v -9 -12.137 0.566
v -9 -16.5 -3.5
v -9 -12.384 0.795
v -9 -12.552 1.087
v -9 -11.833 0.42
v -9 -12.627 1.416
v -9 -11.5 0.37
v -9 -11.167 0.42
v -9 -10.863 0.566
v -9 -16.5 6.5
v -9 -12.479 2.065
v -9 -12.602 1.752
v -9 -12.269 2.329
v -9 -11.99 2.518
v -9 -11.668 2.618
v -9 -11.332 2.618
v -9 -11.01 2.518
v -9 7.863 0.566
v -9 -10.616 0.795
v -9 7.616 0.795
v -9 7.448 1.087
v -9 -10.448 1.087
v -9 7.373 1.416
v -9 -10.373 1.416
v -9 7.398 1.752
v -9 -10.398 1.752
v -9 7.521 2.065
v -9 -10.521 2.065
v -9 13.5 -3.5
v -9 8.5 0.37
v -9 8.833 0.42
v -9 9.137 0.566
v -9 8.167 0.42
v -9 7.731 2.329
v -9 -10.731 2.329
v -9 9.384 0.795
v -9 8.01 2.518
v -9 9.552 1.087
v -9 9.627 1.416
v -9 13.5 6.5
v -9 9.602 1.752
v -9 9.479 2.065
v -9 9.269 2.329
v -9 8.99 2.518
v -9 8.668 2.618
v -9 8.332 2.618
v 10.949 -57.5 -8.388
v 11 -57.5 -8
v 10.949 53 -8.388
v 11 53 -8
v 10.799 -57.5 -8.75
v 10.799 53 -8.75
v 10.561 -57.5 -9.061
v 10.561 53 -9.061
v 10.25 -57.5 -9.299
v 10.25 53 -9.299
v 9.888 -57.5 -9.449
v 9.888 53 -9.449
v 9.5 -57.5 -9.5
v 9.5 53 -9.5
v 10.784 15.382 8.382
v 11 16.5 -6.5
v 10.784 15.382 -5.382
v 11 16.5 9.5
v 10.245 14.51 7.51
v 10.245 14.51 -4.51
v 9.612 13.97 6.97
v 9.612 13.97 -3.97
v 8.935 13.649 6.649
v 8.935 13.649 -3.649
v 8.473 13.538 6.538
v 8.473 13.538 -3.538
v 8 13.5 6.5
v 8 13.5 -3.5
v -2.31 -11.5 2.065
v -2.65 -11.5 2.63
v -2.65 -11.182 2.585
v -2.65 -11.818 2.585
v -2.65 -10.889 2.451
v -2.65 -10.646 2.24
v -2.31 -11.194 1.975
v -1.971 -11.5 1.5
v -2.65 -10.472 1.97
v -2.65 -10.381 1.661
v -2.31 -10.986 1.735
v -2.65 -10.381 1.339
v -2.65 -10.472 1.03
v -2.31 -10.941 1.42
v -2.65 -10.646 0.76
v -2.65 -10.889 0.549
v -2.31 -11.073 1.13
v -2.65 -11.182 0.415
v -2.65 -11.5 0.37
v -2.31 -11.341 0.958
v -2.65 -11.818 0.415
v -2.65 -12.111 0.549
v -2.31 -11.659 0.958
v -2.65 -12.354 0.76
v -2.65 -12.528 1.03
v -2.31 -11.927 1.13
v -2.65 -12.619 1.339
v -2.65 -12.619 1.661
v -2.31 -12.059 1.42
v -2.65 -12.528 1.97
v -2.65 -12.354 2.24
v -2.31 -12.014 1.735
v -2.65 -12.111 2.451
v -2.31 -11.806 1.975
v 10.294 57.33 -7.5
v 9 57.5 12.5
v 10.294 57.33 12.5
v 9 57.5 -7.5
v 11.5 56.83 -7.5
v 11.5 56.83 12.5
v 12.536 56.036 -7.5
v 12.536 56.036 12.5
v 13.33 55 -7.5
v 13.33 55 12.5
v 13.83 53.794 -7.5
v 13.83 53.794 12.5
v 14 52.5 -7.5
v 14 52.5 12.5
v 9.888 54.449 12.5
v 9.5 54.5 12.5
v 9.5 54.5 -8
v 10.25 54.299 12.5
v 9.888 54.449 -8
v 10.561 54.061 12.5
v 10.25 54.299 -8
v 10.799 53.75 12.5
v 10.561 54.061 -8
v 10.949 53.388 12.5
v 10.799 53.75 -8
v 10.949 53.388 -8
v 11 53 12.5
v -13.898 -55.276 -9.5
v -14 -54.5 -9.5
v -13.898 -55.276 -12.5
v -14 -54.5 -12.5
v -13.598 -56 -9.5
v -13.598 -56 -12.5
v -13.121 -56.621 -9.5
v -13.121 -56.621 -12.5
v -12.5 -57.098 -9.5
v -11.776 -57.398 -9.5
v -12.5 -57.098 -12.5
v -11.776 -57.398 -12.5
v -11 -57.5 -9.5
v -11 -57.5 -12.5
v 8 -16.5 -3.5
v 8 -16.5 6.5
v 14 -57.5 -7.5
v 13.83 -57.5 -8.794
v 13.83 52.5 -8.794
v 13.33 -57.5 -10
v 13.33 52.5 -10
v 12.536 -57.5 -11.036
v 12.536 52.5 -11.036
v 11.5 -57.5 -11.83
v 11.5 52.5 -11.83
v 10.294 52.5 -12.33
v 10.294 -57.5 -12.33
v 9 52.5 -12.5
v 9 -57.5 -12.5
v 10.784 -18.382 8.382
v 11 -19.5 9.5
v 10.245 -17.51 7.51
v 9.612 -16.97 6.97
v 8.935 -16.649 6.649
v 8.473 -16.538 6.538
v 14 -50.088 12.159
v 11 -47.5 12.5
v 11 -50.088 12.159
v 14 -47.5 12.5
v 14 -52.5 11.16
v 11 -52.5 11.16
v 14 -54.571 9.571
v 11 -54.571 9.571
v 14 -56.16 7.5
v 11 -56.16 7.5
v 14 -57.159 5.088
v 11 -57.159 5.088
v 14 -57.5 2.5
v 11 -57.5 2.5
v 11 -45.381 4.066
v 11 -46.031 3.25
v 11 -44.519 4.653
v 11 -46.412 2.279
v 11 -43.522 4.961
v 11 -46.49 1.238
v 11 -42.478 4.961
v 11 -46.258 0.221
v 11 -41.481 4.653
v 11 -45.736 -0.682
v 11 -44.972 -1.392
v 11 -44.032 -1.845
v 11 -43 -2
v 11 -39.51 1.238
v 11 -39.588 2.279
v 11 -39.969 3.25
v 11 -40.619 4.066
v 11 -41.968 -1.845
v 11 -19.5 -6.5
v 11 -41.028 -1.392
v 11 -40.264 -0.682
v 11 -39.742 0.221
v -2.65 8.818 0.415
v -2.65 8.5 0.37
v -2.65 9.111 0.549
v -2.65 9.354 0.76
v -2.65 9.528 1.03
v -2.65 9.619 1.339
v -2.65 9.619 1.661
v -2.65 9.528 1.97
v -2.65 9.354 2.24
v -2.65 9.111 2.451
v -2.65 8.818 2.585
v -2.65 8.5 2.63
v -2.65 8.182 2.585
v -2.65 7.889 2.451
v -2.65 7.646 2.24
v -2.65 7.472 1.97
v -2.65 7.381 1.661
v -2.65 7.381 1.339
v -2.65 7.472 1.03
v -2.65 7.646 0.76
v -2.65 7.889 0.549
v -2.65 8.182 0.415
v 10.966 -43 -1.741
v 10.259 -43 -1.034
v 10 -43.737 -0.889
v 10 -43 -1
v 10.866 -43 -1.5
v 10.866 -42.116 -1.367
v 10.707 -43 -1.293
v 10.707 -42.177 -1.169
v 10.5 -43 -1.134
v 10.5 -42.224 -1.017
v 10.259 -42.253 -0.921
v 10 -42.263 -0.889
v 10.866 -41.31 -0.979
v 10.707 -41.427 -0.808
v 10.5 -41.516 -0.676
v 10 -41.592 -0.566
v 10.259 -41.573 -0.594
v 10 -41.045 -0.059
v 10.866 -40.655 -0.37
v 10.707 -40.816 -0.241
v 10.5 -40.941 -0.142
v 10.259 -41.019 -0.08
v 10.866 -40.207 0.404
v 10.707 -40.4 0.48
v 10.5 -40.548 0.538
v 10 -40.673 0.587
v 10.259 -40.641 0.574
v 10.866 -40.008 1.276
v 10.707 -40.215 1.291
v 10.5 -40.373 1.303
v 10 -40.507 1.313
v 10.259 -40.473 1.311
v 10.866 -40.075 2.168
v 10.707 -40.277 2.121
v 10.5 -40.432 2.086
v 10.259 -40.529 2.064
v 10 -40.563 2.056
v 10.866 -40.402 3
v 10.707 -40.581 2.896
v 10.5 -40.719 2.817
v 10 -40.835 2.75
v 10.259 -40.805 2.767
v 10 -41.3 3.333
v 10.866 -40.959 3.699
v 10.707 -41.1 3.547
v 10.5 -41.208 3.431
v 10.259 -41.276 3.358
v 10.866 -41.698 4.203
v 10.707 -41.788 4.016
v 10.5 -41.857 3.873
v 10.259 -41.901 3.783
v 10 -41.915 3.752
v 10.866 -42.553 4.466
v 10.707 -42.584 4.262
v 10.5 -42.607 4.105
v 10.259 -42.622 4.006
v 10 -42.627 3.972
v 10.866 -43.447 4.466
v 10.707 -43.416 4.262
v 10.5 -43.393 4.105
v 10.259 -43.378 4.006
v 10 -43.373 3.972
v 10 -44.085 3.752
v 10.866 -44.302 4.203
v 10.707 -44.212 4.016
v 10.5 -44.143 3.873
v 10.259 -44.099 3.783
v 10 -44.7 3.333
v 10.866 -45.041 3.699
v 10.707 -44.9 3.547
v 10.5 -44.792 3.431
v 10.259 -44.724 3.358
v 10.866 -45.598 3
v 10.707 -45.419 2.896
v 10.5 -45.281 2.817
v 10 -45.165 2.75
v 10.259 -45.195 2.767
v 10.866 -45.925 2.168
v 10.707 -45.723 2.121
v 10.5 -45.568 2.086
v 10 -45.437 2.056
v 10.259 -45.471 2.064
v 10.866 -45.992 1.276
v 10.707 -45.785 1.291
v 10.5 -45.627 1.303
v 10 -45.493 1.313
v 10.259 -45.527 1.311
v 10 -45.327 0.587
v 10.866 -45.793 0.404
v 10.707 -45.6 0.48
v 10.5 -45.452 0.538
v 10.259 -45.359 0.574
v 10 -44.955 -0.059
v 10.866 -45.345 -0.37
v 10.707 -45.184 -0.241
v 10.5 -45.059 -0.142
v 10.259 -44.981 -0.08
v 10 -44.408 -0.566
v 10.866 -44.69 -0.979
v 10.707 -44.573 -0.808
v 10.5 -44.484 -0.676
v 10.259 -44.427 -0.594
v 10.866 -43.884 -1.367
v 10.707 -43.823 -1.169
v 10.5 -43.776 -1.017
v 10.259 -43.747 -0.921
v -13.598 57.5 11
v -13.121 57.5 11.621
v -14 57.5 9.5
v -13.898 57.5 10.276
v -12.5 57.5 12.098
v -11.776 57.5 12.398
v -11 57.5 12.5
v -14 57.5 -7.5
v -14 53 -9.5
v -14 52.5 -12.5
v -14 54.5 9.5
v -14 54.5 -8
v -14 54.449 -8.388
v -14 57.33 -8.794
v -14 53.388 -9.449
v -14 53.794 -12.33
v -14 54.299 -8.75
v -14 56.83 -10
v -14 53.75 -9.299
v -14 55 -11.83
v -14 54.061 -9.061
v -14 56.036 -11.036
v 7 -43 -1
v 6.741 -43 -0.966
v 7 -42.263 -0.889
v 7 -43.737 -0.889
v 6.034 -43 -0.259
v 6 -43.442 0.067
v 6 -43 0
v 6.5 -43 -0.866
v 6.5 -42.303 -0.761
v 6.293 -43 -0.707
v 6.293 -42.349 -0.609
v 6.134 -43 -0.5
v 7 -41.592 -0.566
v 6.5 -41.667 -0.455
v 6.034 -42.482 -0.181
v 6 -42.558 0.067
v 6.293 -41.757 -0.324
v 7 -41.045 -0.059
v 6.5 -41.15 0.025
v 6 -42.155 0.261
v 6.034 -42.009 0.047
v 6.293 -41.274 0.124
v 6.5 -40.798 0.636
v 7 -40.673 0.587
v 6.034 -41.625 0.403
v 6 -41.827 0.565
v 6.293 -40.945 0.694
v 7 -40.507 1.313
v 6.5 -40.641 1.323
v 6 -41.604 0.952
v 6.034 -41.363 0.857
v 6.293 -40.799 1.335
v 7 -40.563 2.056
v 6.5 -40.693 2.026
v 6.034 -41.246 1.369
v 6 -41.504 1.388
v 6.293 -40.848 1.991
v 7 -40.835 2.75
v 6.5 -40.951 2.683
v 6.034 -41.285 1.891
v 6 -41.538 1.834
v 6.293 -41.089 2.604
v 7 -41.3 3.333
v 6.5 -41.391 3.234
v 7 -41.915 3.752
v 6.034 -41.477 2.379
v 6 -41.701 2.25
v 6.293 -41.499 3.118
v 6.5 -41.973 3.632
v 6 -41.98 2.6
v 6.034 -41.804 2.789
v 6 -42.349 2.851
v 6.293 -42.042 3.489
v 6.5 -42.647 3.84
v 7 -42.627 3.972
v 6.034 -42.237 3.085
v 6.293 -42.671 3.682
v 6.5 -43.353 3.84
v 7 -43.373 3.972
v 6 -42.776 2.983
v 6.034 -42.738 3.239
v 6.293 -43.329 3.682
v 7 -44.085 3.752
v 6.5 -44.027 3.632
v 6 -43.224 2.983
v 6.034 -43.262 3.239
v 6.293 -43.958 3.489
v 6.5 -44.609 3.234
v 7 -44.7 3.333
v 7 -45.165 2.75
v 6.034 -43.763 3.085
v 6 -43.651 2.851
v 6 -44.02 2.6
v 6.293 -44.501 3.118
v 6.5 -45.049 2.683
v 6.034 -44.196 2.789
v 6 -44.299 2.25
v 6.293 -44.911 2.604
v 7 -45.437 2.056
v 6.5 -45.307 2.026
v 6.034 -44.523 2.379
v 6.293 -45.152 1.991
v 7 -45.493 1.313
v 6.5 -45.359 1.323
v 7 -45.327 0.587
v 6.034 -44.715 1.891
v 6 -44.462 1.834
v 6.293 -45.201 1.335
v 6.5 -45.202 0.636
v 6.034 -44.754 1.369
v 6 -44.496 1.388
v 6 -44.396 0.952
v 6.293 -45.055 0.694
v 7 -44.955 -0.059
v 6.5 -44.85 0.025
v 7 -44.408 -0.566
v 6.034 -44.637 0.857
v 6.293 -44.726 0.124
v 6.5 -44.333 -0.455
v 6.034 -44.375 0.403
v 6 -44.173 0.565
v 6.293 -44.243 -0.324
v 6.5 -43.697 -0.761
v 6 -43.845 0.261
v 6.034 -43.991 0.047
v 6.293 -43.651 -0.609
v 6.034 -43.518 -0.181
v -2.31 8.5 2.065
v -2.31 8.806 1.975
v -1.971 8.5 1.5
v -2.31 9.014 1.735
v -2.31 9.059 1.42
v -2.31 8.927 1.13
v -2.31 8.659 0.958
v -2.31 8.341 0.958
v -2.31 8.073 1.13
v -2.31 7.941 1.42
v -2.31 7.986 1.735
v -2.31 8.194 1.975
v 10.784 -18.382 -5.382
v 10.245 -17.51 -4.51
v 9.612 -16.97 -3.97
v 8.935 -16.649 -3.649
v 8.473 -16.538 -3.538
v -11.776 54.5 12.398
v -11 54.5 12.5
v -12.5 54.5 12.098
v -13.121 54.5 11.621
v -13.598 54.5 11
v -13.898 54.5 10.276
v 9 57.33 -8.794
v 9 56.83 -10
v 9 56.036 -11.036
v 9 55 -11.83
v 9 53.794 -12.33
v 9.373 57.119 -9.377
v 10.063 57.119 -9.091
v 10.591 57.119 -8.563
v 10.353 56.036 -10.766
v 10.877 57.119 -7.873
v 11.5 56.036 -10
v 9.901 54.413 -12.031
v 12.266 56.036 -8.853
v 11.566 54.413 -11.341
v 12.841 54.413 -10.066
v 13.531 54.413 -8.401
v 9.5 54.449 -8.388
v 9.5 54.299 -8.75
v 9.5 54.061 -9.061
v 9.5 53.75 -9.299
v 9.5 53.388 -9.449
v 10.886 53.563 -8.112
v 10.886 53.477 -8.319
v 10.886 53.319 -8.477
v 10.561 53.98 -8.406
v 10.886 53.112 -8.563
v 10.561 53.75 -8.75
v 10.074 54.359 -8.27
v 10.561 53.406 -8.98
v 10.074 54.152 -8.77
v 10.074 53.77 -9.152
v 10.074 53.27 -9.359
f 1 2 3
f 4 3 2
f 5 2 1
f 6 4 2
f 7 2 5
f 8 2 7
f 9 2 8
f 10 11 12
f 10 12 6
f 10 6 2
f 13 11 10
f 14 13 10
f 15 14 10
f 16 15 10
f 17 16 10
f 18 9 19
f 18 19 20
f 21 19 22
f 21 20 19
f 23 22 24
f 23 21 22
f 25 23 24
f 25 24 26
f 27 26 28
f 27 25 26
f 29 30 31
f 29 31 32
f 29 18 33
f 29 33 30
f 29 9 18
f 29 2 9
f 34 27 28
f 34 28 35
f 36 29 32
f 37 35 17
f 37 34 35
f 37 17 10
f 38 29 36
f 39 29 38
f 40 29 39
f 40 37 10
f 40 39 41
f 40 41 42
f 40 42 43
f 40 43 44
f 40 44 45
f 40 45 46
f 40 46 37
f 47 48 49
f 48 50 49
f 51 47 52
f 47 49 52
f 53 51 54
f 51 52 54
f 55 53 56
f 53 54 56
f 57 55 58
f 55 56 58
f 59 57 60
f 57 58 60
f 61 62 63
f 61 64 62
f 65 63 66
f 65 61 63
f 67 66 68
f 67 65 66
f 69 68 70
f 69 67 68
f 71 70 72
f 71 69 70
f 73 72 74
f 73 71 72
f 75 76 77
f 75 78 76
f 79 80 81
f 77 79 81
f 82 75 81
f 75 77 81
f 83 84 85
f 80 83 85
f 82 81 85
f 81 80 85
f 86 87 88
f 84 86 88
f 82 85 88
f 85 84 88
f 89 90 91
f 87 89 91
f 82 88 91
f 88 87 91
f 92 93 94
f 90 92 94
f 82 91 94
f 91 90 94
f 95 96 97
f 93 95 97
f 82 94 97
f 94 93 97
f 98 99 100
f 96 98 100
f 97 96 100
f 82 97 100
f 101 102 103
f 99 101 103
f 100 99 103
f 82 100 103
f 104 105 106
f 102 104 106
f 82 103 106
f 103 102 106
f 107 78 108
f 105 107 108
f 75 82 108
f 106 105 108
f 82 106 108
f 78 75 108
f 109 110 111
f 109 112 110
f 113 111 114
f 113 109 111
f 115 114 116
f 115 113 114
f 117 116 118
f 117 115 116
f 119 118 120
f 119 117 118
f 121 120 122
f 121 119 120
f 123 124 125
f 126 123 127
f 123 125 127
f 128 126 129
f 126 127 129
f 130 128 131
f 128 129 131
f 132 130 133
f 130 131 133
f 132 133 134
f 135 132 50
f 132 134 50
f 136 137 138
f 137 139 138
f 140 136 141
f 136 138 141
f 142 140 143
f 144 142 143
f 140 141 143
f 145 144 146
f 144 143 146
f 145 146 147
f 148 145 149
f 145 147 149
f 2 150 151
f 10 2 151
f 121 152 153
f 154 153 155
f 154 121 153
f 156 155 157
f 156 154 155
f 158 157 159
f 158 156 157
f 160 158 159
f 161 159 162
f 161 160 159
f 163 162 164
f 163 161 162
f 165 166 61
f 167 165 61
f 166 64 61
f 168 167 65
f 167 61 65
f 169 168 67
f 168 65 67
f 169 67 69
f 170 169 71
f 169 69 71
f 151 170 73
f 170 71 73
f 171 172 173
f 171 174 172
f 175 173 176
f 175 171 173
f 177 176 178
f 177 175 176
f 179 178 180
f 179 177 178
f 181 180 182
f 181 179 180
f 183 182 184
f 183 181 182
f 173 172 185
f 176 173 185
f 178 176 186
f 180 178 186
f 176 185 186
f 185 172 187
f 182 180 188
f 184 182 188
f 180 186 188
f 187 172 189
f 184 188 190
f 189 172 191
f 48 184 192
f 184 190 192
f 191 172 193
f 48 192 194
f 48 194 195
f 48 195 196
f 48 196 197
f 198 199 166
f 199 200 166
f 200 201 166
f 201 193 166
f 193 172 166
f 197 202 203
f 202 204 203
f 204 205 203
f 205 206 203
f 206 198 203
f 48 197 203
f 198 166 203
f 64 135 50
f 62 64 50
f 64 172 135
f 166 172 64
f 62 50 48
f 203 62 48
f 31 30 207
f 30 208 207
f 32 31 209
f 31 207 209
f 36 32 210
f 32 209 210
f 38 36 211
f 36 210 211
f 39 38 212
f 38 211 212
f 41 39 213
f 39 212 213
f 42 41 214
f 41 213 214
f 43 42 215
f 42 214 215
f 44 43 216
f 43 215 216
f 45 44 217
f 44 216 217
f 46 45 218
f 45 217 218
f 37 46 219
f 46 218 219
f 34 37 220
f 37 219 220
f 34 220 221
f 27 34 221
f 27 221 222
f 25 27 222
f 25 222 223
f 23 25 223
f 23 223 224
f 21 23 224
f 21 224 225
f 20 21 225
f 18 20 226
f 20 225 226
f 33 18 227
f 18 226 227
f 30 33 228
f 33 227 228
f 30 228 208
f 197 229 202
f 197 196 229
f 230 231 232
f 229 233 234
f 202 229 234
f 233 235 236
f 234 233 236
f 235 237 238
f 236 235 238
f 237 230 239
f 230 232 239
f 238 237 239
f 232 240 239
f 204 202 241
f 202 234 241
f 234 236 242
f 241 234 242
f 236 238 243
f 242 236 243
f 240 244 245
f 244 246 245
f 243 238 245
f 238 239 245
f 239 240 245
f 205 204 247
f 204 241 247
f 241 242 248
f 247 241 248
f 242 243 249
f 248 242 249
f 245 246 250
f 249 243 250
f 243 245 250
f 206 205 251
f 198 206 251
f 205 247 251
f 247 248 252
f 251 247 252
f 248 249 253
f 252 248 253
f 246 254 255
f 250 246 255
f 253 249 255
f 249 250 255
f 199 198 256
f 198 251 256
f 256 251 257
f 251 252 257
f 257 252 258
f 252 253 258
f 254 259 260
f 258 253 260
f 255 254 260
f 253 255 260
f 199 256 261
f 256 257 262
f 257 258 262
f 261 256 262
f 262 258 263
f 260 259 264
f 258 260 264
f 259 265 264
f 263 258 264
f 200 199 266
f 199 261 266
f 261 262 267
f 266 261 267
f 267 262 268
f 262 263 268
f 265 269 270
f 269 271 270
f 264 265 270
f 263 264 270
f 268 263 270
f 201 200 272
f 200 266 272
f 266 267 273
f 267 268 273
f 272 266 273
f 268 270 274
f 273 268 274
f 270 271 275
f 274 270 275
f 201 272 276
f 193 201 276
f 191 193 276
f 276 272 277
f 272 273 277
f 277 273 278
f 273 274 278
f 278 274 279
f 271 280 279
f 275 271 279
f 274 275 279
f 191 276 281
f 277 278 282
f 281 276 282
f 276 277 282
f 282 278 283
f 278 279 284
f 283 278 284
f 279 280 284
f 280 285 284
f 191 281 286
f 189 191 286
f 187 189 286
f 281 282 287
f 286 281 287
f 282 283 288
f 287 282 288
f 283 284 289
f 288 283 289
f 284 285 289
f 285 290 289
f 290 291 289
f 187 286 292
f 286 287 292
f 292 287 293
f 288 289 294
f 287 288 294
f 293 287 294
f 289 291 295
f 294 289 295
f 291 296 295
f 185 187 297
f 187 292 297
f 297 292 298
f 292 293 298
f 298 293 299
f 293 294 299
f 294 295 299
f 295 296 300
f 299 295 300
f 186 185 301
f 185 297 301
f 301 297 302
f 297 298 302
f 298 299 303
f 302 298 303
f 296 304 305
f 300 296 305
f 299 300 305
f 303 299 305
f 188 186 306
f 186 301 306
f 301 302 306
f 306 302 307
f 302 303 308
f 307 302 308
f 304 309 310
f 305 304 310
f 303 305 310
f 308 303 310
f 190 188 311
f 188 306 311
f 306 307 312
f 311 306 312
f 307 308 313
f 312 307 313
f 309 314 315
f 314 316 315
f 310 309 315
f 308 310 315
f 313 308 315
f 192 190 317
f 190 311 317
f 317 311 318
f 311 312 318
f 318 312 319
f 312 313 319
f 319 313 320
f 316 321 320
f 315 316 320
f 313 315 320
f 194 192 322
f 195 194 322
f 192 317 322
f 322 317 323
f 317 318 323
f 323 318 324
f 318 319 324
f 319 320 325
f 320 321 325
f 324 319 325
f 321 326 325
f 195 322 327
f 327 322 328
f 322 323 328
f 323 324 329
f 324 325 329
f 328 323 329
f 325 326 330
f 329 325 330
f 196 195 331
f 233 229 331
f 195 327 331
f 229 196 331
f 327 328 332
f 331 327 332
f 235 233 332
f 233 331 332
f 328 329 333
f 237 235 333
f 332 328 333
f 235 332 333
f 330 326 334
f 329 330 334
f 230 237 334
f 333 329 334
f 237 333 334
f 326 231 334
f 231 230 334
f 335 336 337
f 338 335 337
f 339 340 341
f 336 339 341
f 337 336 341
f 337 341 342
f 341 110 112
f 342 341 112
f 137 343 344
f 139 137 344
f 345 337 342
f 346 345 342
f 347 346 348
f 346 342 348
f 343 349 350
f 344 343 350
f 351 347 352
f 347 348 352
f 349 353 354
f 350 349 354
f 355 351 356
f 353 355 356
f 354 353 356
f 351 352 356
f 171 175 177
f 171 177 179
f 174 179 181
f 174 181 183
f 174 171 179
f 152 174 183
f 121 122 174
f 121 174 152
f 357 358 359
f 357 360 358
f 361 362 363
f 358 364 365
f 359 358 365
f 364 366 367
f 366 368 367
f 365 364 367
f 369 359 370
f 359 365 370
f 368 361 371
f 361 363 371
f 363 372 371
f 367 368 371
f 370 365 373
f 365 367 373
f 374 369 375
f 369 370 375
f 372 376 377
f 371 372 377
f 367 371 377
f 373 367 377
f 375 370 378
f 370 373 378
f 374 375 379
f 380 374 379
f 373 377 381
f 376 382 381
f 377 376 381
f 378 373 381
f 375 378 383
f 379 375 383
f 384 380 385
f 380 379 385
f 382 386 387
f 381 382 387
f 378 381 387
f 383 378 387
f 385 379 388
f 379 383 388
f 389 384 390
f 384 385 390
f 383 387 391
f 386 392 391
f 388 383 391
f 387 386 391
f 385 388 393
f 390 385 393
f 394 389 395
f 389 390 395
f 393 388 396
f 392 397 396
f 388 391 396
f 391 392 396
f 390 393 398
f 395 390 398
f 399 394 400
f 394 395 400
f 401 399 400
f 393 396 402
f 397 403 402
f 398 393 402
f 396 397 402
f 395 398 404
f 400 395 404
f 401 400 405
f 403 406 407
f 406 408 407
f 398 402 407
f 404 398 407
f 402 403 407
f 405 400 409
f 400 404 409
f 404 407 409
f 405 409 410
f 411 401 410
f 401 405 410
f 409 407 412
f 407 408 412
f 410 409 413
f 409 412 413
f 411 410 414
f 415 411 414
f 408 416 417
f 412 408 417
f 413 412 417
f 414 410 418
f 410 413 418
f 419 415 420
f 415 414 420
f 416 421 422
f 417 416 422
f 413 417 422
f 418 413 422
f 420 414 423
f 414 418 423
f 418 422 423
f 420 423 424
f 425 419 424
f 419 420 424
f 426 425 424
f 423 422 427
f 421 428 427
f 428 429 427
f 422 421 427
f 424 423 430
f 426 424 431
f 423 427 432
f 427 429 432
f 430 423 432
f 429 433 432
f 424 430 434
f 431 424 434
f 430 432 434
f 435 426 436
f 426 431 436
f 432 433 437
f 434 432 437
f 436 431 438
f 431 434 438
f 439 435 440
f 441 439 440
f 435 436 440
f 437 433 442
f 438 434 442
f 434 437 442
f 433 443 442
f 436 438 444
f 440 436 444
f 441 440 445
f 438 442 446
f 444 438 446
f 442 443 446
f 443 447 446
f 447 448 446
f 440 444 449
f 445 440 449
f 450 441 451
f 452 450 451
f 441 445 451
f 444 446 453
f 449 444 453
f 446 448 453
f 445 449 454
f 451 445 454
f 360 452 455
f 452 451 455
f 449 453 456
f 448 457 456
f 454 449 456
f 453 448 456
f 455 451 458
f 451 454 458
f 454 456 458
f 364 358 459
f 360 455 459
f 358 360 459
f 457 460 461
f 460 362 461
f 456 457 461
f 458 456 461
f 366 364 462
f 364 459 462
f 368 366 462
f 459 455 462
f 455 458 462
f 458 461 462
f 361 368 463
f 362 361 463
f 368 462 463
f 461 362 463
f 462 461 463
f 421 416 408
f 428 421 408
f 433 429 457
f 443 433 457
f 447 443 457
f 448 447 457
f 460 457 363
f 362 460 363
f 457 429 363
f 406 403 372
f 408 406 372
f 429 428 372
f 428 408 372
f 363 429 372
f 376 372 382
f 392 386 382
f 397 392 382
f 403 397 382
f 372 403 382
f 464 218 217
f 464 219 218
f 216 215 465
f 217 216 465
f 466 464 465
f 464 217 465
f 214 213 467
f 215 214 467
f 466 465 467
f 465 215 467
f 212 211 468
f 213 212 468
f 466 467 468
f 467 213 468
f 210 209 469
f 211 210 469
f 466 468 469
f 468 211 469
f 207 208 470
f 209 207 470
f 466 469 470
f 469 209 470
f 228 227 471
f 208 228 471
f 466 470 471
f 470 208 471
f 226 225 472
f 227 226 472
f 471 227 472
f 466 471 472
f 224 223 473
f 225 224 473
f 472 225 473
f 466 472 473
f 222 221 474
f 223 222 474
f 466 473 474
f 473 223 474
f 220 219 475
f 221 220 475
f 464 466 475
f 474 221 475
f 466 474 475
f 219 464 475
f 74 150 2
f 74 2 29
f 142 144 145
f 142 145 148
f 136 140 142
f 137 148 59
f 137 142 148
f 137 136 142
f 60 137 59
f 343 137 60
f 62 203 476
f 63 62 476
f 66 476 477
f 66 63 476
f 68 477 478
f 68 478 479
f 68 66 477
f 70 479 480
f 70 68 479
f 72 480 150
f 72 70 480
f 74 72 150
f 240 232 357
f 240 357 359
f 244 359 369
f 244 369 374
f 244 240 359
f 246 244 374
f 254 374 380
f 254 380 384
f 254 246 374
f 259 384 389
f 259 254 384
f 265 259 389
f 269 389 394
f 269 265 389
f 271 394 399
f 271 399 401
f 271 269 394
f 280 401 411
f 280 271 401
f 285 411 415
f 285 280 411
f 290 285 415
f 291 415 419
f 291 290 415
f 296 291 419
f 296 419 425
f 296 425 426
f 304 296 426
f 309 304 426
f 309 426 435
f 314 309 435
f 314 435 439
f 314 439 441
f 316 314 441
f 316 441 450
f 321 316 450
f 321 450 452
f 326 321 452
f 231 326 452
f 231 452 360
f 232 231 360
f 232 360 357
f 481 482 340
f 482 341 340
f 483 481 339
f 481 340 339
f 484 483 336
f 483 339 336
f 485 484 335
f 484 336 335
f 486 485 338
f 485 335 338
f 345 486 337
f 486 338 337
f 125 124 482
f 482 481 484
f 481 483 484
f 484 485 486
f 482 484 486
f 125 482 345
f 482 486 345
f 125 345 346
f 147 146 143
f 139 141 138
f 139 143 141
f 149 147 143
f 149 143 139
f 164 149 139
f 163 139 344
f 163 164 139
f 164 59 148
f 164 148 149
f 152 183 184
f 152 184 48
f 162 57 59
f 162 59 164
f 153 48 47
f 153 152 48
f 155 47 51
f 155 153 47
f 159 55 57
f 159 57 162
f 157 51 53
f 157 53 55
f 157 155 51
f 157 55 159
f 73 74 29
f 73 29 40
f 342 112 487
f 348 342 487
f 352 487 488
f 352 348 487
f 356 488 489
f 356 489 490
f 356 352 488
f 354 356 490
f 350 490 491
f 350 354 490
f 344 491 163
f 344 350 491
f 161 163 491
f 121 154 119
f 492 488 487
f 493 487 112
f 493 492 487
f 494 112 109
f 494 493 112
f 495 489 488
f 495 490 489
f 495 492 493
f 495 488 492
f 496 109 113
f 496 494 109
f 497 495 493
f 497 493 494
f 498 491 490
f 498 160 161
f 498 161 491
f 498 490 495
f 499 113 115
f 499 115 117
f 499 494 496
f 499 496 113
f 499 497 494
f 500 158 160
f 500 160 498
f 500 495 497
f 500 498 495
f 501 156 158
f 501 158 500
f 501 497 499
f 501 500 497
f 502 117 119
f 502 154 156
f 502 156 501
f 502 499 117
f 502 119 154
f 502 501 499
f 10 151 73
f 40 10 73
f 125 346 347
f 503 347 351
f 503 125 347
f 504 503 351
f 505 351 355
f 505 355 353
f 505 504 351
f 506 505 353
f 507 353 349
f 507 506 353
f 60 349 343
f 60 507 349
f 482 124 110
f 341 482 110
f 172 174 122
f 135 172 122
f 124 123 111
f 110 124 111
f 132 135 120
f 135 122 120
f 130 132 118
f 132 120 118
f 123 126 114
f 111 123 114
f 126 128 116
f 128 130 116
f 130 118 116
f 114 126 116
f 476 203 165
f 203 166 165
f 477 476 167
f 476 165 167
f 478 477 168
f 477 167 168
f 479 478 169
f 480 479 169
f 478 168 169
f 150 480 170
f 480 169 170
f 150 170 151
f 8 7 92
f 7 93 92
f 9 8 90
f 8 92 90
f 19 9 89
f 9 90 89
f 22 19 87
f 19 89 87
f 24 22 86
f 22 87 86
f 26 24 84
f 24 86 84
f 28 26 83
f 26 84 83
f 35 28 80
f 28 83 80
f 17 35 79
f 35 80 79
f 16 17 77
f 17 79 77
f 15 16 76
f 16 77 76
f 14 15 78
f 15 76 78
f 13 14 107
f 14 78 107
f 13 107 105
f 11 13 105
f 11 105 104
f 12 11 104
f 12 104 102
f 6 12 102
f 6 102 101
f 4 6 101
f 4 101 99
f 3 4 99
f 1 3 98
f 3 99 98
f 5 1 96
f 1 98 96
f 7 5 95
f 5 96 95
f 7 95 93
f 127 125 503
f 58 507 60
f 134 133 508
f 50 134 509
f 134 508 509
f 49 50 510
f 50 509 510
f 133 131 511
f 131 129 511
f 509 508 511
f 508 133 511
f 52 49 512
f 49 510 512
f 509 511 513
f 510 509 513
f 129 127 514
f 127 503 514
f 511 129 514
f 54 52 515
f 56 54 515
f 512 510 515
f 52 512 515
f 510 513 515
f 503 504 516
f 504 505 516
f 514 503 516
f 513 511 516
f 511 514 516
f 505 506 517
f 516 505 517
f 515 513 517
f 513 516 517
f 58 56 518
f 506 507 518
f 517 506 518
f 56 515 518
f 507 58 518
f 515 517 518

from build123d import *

# Parameters (mm, degrees)
SKETCH1_W                 = 25
SKETCH1_H                 = 115
BOSS_EXTRUDE1_DEPTH       = 14
SKETCH3_W                 = 22
SKETCH3_H                 = 112
CUT_EXTRUDE1_DEPTH        = 25
SKETCH4_W                 = 10
SKETCH4_H                 = 30
BOSS_EXTRUDE2_DEPTH       = 20
F_2_CLEARANCE_HOLE1_D     = 2.2606
F_2_CLEARANCE_HOLE1_DEPTH = 6.35
F_2_CLEARANCE_HOLE1_TIP   = 0.679152758
FILLET1_R                 = 1.5
FILLET3_R                 = 5
FILLET4_R                 = 10
FILLET5_R                 = 3
FILLET6_R                 = 3
SKETCH7_R                 = 2.5
BOSS_EXTRUDE3_DEPTH       = 8
FILLET7_R                 = 1


with BuildPart() as part:
    # Sketch1 → Boss-Extrude1 (new, symmetric)
    with BuildSketch(Plane(origin=(0, 0, 0), x_dir=(0, 0, -1), z_dir=(1, 0, 0))):
        Rectangle(SKETCH1_W, SKETCH1_H)
    extrude(amount=BOSS_EXTRUDE1_DEPTH, both=True)

    # Sketch3 → Cut-Extrude1 (cut)
    with BuildSketch(Plane(origin=(-14, 0, 0), x_dir=(0, 0, -1), z_dir=(1, 0, 0))):
        with Locations((-1.5, -1.5)):
            Rectangle(SKETCH3_W, SKETCH3_H)
    extrude(amount=CUT_EXTRUDE1_DEPTH, mode=Mode.SUBTRACT)

    # Sketch4 → Boss-Extrude2 (add)
    with BuildSketch(Plane.ZY.offset(-11)):
        with Locations((1.5, -1.5)):
            Rectangle(SKETCH4_W, SKETCH4_H)
    extrude(amount=BOSS_EXTRUDE2_DEPTH)

    # #2 Clearance Hole1
    with Locations(Plane.ZY.offset(9)):
        with Locations((1.5, 8.5), (1.5, -11.5)):
            Hole(F_2_CLEARANCE_HOLE1_D / 2, depth=F_2_CLEARANCE_HOLE1_DEPTH)
            with Locations((0, 0, -(F_2_CLEARANCE_HOLE1_DEPTH + F_2_CLEARANCE_HOLE1_TIP / 2))):  # 118° drill point
                Cone(0, F_2_CLEARANCE_HOLE1_D / 2, F_2_CLEARANCE_HOLE1_TIP, mode=Mode.SUBTRACT)

    # Fillet1
    fillet1_edges = [part.edges().sort_by_distance(p)[0] for p in [
        (-1.5, 54.5, -9.5),
        (11, 54.5, 1.5),
        (11, -1.5, -9.5),
    ]]
    fillet(fillet1_edges, radius=FILLET1_R)

    # Fillet3
    fillet3_edges = [part.edges().sort_by_distance(p)[0] for p in [
        (14, 0, -12.5),
        (0, 57.5, -12.5),
        (14, 57.5, 0),
    ]]
    fillet(fillet3_edges, radius=FILLET3_R)

    # Fillet4
    fillet4_edges = [part.edges().sort_by_distance(p)[0] for p in [
        (12.5, -57.5, 12.5),
    ]]
    fillet(fillet4_edges, radius=FILLET4_R)

    # Fillet5
    fillet5_edges = [part.edges().sort_by_distance(p)[0] for p in [
        (-14, -57.5, -11),
        (-14, 56, 12.5),
    ]]
    fillet(fillet5_edges, radius=FILLET5_R)

    # Fillet6
    fillet6_edges = [part.edges().sort_by_distance(p)[0] for p in [
        (11, -1.5, 6.5),
        (11, 13.5, 1.5),
        (11, -1.5, -3.5),
        (11, -16.5, 1.5),
    ]]
    fillet(fillet6_edges, radius=FILLET6_R)

    # Sketch7 → Boss-Extrude3 (add)
    with BuildSketch(Plane(origin=(14, 0, 0), x_dir=(0, 0, -1), z_dir=(1, 0, 0))):
        with Locations((-1.5, -43)):
            Circle(SKETCH7_R)
    extrude(amount=-BOSS_EXTRUDE3_DEPTH)

    # Fillet7
    fillet7_edges = [part.edges().sort_by_distance(p)[0] for p in [
        (6, -43, 4),
        (11, -43, 4),
    ]]
    fillet(fillet7_edges, radius=FILLET7_R)


solid = part.part
